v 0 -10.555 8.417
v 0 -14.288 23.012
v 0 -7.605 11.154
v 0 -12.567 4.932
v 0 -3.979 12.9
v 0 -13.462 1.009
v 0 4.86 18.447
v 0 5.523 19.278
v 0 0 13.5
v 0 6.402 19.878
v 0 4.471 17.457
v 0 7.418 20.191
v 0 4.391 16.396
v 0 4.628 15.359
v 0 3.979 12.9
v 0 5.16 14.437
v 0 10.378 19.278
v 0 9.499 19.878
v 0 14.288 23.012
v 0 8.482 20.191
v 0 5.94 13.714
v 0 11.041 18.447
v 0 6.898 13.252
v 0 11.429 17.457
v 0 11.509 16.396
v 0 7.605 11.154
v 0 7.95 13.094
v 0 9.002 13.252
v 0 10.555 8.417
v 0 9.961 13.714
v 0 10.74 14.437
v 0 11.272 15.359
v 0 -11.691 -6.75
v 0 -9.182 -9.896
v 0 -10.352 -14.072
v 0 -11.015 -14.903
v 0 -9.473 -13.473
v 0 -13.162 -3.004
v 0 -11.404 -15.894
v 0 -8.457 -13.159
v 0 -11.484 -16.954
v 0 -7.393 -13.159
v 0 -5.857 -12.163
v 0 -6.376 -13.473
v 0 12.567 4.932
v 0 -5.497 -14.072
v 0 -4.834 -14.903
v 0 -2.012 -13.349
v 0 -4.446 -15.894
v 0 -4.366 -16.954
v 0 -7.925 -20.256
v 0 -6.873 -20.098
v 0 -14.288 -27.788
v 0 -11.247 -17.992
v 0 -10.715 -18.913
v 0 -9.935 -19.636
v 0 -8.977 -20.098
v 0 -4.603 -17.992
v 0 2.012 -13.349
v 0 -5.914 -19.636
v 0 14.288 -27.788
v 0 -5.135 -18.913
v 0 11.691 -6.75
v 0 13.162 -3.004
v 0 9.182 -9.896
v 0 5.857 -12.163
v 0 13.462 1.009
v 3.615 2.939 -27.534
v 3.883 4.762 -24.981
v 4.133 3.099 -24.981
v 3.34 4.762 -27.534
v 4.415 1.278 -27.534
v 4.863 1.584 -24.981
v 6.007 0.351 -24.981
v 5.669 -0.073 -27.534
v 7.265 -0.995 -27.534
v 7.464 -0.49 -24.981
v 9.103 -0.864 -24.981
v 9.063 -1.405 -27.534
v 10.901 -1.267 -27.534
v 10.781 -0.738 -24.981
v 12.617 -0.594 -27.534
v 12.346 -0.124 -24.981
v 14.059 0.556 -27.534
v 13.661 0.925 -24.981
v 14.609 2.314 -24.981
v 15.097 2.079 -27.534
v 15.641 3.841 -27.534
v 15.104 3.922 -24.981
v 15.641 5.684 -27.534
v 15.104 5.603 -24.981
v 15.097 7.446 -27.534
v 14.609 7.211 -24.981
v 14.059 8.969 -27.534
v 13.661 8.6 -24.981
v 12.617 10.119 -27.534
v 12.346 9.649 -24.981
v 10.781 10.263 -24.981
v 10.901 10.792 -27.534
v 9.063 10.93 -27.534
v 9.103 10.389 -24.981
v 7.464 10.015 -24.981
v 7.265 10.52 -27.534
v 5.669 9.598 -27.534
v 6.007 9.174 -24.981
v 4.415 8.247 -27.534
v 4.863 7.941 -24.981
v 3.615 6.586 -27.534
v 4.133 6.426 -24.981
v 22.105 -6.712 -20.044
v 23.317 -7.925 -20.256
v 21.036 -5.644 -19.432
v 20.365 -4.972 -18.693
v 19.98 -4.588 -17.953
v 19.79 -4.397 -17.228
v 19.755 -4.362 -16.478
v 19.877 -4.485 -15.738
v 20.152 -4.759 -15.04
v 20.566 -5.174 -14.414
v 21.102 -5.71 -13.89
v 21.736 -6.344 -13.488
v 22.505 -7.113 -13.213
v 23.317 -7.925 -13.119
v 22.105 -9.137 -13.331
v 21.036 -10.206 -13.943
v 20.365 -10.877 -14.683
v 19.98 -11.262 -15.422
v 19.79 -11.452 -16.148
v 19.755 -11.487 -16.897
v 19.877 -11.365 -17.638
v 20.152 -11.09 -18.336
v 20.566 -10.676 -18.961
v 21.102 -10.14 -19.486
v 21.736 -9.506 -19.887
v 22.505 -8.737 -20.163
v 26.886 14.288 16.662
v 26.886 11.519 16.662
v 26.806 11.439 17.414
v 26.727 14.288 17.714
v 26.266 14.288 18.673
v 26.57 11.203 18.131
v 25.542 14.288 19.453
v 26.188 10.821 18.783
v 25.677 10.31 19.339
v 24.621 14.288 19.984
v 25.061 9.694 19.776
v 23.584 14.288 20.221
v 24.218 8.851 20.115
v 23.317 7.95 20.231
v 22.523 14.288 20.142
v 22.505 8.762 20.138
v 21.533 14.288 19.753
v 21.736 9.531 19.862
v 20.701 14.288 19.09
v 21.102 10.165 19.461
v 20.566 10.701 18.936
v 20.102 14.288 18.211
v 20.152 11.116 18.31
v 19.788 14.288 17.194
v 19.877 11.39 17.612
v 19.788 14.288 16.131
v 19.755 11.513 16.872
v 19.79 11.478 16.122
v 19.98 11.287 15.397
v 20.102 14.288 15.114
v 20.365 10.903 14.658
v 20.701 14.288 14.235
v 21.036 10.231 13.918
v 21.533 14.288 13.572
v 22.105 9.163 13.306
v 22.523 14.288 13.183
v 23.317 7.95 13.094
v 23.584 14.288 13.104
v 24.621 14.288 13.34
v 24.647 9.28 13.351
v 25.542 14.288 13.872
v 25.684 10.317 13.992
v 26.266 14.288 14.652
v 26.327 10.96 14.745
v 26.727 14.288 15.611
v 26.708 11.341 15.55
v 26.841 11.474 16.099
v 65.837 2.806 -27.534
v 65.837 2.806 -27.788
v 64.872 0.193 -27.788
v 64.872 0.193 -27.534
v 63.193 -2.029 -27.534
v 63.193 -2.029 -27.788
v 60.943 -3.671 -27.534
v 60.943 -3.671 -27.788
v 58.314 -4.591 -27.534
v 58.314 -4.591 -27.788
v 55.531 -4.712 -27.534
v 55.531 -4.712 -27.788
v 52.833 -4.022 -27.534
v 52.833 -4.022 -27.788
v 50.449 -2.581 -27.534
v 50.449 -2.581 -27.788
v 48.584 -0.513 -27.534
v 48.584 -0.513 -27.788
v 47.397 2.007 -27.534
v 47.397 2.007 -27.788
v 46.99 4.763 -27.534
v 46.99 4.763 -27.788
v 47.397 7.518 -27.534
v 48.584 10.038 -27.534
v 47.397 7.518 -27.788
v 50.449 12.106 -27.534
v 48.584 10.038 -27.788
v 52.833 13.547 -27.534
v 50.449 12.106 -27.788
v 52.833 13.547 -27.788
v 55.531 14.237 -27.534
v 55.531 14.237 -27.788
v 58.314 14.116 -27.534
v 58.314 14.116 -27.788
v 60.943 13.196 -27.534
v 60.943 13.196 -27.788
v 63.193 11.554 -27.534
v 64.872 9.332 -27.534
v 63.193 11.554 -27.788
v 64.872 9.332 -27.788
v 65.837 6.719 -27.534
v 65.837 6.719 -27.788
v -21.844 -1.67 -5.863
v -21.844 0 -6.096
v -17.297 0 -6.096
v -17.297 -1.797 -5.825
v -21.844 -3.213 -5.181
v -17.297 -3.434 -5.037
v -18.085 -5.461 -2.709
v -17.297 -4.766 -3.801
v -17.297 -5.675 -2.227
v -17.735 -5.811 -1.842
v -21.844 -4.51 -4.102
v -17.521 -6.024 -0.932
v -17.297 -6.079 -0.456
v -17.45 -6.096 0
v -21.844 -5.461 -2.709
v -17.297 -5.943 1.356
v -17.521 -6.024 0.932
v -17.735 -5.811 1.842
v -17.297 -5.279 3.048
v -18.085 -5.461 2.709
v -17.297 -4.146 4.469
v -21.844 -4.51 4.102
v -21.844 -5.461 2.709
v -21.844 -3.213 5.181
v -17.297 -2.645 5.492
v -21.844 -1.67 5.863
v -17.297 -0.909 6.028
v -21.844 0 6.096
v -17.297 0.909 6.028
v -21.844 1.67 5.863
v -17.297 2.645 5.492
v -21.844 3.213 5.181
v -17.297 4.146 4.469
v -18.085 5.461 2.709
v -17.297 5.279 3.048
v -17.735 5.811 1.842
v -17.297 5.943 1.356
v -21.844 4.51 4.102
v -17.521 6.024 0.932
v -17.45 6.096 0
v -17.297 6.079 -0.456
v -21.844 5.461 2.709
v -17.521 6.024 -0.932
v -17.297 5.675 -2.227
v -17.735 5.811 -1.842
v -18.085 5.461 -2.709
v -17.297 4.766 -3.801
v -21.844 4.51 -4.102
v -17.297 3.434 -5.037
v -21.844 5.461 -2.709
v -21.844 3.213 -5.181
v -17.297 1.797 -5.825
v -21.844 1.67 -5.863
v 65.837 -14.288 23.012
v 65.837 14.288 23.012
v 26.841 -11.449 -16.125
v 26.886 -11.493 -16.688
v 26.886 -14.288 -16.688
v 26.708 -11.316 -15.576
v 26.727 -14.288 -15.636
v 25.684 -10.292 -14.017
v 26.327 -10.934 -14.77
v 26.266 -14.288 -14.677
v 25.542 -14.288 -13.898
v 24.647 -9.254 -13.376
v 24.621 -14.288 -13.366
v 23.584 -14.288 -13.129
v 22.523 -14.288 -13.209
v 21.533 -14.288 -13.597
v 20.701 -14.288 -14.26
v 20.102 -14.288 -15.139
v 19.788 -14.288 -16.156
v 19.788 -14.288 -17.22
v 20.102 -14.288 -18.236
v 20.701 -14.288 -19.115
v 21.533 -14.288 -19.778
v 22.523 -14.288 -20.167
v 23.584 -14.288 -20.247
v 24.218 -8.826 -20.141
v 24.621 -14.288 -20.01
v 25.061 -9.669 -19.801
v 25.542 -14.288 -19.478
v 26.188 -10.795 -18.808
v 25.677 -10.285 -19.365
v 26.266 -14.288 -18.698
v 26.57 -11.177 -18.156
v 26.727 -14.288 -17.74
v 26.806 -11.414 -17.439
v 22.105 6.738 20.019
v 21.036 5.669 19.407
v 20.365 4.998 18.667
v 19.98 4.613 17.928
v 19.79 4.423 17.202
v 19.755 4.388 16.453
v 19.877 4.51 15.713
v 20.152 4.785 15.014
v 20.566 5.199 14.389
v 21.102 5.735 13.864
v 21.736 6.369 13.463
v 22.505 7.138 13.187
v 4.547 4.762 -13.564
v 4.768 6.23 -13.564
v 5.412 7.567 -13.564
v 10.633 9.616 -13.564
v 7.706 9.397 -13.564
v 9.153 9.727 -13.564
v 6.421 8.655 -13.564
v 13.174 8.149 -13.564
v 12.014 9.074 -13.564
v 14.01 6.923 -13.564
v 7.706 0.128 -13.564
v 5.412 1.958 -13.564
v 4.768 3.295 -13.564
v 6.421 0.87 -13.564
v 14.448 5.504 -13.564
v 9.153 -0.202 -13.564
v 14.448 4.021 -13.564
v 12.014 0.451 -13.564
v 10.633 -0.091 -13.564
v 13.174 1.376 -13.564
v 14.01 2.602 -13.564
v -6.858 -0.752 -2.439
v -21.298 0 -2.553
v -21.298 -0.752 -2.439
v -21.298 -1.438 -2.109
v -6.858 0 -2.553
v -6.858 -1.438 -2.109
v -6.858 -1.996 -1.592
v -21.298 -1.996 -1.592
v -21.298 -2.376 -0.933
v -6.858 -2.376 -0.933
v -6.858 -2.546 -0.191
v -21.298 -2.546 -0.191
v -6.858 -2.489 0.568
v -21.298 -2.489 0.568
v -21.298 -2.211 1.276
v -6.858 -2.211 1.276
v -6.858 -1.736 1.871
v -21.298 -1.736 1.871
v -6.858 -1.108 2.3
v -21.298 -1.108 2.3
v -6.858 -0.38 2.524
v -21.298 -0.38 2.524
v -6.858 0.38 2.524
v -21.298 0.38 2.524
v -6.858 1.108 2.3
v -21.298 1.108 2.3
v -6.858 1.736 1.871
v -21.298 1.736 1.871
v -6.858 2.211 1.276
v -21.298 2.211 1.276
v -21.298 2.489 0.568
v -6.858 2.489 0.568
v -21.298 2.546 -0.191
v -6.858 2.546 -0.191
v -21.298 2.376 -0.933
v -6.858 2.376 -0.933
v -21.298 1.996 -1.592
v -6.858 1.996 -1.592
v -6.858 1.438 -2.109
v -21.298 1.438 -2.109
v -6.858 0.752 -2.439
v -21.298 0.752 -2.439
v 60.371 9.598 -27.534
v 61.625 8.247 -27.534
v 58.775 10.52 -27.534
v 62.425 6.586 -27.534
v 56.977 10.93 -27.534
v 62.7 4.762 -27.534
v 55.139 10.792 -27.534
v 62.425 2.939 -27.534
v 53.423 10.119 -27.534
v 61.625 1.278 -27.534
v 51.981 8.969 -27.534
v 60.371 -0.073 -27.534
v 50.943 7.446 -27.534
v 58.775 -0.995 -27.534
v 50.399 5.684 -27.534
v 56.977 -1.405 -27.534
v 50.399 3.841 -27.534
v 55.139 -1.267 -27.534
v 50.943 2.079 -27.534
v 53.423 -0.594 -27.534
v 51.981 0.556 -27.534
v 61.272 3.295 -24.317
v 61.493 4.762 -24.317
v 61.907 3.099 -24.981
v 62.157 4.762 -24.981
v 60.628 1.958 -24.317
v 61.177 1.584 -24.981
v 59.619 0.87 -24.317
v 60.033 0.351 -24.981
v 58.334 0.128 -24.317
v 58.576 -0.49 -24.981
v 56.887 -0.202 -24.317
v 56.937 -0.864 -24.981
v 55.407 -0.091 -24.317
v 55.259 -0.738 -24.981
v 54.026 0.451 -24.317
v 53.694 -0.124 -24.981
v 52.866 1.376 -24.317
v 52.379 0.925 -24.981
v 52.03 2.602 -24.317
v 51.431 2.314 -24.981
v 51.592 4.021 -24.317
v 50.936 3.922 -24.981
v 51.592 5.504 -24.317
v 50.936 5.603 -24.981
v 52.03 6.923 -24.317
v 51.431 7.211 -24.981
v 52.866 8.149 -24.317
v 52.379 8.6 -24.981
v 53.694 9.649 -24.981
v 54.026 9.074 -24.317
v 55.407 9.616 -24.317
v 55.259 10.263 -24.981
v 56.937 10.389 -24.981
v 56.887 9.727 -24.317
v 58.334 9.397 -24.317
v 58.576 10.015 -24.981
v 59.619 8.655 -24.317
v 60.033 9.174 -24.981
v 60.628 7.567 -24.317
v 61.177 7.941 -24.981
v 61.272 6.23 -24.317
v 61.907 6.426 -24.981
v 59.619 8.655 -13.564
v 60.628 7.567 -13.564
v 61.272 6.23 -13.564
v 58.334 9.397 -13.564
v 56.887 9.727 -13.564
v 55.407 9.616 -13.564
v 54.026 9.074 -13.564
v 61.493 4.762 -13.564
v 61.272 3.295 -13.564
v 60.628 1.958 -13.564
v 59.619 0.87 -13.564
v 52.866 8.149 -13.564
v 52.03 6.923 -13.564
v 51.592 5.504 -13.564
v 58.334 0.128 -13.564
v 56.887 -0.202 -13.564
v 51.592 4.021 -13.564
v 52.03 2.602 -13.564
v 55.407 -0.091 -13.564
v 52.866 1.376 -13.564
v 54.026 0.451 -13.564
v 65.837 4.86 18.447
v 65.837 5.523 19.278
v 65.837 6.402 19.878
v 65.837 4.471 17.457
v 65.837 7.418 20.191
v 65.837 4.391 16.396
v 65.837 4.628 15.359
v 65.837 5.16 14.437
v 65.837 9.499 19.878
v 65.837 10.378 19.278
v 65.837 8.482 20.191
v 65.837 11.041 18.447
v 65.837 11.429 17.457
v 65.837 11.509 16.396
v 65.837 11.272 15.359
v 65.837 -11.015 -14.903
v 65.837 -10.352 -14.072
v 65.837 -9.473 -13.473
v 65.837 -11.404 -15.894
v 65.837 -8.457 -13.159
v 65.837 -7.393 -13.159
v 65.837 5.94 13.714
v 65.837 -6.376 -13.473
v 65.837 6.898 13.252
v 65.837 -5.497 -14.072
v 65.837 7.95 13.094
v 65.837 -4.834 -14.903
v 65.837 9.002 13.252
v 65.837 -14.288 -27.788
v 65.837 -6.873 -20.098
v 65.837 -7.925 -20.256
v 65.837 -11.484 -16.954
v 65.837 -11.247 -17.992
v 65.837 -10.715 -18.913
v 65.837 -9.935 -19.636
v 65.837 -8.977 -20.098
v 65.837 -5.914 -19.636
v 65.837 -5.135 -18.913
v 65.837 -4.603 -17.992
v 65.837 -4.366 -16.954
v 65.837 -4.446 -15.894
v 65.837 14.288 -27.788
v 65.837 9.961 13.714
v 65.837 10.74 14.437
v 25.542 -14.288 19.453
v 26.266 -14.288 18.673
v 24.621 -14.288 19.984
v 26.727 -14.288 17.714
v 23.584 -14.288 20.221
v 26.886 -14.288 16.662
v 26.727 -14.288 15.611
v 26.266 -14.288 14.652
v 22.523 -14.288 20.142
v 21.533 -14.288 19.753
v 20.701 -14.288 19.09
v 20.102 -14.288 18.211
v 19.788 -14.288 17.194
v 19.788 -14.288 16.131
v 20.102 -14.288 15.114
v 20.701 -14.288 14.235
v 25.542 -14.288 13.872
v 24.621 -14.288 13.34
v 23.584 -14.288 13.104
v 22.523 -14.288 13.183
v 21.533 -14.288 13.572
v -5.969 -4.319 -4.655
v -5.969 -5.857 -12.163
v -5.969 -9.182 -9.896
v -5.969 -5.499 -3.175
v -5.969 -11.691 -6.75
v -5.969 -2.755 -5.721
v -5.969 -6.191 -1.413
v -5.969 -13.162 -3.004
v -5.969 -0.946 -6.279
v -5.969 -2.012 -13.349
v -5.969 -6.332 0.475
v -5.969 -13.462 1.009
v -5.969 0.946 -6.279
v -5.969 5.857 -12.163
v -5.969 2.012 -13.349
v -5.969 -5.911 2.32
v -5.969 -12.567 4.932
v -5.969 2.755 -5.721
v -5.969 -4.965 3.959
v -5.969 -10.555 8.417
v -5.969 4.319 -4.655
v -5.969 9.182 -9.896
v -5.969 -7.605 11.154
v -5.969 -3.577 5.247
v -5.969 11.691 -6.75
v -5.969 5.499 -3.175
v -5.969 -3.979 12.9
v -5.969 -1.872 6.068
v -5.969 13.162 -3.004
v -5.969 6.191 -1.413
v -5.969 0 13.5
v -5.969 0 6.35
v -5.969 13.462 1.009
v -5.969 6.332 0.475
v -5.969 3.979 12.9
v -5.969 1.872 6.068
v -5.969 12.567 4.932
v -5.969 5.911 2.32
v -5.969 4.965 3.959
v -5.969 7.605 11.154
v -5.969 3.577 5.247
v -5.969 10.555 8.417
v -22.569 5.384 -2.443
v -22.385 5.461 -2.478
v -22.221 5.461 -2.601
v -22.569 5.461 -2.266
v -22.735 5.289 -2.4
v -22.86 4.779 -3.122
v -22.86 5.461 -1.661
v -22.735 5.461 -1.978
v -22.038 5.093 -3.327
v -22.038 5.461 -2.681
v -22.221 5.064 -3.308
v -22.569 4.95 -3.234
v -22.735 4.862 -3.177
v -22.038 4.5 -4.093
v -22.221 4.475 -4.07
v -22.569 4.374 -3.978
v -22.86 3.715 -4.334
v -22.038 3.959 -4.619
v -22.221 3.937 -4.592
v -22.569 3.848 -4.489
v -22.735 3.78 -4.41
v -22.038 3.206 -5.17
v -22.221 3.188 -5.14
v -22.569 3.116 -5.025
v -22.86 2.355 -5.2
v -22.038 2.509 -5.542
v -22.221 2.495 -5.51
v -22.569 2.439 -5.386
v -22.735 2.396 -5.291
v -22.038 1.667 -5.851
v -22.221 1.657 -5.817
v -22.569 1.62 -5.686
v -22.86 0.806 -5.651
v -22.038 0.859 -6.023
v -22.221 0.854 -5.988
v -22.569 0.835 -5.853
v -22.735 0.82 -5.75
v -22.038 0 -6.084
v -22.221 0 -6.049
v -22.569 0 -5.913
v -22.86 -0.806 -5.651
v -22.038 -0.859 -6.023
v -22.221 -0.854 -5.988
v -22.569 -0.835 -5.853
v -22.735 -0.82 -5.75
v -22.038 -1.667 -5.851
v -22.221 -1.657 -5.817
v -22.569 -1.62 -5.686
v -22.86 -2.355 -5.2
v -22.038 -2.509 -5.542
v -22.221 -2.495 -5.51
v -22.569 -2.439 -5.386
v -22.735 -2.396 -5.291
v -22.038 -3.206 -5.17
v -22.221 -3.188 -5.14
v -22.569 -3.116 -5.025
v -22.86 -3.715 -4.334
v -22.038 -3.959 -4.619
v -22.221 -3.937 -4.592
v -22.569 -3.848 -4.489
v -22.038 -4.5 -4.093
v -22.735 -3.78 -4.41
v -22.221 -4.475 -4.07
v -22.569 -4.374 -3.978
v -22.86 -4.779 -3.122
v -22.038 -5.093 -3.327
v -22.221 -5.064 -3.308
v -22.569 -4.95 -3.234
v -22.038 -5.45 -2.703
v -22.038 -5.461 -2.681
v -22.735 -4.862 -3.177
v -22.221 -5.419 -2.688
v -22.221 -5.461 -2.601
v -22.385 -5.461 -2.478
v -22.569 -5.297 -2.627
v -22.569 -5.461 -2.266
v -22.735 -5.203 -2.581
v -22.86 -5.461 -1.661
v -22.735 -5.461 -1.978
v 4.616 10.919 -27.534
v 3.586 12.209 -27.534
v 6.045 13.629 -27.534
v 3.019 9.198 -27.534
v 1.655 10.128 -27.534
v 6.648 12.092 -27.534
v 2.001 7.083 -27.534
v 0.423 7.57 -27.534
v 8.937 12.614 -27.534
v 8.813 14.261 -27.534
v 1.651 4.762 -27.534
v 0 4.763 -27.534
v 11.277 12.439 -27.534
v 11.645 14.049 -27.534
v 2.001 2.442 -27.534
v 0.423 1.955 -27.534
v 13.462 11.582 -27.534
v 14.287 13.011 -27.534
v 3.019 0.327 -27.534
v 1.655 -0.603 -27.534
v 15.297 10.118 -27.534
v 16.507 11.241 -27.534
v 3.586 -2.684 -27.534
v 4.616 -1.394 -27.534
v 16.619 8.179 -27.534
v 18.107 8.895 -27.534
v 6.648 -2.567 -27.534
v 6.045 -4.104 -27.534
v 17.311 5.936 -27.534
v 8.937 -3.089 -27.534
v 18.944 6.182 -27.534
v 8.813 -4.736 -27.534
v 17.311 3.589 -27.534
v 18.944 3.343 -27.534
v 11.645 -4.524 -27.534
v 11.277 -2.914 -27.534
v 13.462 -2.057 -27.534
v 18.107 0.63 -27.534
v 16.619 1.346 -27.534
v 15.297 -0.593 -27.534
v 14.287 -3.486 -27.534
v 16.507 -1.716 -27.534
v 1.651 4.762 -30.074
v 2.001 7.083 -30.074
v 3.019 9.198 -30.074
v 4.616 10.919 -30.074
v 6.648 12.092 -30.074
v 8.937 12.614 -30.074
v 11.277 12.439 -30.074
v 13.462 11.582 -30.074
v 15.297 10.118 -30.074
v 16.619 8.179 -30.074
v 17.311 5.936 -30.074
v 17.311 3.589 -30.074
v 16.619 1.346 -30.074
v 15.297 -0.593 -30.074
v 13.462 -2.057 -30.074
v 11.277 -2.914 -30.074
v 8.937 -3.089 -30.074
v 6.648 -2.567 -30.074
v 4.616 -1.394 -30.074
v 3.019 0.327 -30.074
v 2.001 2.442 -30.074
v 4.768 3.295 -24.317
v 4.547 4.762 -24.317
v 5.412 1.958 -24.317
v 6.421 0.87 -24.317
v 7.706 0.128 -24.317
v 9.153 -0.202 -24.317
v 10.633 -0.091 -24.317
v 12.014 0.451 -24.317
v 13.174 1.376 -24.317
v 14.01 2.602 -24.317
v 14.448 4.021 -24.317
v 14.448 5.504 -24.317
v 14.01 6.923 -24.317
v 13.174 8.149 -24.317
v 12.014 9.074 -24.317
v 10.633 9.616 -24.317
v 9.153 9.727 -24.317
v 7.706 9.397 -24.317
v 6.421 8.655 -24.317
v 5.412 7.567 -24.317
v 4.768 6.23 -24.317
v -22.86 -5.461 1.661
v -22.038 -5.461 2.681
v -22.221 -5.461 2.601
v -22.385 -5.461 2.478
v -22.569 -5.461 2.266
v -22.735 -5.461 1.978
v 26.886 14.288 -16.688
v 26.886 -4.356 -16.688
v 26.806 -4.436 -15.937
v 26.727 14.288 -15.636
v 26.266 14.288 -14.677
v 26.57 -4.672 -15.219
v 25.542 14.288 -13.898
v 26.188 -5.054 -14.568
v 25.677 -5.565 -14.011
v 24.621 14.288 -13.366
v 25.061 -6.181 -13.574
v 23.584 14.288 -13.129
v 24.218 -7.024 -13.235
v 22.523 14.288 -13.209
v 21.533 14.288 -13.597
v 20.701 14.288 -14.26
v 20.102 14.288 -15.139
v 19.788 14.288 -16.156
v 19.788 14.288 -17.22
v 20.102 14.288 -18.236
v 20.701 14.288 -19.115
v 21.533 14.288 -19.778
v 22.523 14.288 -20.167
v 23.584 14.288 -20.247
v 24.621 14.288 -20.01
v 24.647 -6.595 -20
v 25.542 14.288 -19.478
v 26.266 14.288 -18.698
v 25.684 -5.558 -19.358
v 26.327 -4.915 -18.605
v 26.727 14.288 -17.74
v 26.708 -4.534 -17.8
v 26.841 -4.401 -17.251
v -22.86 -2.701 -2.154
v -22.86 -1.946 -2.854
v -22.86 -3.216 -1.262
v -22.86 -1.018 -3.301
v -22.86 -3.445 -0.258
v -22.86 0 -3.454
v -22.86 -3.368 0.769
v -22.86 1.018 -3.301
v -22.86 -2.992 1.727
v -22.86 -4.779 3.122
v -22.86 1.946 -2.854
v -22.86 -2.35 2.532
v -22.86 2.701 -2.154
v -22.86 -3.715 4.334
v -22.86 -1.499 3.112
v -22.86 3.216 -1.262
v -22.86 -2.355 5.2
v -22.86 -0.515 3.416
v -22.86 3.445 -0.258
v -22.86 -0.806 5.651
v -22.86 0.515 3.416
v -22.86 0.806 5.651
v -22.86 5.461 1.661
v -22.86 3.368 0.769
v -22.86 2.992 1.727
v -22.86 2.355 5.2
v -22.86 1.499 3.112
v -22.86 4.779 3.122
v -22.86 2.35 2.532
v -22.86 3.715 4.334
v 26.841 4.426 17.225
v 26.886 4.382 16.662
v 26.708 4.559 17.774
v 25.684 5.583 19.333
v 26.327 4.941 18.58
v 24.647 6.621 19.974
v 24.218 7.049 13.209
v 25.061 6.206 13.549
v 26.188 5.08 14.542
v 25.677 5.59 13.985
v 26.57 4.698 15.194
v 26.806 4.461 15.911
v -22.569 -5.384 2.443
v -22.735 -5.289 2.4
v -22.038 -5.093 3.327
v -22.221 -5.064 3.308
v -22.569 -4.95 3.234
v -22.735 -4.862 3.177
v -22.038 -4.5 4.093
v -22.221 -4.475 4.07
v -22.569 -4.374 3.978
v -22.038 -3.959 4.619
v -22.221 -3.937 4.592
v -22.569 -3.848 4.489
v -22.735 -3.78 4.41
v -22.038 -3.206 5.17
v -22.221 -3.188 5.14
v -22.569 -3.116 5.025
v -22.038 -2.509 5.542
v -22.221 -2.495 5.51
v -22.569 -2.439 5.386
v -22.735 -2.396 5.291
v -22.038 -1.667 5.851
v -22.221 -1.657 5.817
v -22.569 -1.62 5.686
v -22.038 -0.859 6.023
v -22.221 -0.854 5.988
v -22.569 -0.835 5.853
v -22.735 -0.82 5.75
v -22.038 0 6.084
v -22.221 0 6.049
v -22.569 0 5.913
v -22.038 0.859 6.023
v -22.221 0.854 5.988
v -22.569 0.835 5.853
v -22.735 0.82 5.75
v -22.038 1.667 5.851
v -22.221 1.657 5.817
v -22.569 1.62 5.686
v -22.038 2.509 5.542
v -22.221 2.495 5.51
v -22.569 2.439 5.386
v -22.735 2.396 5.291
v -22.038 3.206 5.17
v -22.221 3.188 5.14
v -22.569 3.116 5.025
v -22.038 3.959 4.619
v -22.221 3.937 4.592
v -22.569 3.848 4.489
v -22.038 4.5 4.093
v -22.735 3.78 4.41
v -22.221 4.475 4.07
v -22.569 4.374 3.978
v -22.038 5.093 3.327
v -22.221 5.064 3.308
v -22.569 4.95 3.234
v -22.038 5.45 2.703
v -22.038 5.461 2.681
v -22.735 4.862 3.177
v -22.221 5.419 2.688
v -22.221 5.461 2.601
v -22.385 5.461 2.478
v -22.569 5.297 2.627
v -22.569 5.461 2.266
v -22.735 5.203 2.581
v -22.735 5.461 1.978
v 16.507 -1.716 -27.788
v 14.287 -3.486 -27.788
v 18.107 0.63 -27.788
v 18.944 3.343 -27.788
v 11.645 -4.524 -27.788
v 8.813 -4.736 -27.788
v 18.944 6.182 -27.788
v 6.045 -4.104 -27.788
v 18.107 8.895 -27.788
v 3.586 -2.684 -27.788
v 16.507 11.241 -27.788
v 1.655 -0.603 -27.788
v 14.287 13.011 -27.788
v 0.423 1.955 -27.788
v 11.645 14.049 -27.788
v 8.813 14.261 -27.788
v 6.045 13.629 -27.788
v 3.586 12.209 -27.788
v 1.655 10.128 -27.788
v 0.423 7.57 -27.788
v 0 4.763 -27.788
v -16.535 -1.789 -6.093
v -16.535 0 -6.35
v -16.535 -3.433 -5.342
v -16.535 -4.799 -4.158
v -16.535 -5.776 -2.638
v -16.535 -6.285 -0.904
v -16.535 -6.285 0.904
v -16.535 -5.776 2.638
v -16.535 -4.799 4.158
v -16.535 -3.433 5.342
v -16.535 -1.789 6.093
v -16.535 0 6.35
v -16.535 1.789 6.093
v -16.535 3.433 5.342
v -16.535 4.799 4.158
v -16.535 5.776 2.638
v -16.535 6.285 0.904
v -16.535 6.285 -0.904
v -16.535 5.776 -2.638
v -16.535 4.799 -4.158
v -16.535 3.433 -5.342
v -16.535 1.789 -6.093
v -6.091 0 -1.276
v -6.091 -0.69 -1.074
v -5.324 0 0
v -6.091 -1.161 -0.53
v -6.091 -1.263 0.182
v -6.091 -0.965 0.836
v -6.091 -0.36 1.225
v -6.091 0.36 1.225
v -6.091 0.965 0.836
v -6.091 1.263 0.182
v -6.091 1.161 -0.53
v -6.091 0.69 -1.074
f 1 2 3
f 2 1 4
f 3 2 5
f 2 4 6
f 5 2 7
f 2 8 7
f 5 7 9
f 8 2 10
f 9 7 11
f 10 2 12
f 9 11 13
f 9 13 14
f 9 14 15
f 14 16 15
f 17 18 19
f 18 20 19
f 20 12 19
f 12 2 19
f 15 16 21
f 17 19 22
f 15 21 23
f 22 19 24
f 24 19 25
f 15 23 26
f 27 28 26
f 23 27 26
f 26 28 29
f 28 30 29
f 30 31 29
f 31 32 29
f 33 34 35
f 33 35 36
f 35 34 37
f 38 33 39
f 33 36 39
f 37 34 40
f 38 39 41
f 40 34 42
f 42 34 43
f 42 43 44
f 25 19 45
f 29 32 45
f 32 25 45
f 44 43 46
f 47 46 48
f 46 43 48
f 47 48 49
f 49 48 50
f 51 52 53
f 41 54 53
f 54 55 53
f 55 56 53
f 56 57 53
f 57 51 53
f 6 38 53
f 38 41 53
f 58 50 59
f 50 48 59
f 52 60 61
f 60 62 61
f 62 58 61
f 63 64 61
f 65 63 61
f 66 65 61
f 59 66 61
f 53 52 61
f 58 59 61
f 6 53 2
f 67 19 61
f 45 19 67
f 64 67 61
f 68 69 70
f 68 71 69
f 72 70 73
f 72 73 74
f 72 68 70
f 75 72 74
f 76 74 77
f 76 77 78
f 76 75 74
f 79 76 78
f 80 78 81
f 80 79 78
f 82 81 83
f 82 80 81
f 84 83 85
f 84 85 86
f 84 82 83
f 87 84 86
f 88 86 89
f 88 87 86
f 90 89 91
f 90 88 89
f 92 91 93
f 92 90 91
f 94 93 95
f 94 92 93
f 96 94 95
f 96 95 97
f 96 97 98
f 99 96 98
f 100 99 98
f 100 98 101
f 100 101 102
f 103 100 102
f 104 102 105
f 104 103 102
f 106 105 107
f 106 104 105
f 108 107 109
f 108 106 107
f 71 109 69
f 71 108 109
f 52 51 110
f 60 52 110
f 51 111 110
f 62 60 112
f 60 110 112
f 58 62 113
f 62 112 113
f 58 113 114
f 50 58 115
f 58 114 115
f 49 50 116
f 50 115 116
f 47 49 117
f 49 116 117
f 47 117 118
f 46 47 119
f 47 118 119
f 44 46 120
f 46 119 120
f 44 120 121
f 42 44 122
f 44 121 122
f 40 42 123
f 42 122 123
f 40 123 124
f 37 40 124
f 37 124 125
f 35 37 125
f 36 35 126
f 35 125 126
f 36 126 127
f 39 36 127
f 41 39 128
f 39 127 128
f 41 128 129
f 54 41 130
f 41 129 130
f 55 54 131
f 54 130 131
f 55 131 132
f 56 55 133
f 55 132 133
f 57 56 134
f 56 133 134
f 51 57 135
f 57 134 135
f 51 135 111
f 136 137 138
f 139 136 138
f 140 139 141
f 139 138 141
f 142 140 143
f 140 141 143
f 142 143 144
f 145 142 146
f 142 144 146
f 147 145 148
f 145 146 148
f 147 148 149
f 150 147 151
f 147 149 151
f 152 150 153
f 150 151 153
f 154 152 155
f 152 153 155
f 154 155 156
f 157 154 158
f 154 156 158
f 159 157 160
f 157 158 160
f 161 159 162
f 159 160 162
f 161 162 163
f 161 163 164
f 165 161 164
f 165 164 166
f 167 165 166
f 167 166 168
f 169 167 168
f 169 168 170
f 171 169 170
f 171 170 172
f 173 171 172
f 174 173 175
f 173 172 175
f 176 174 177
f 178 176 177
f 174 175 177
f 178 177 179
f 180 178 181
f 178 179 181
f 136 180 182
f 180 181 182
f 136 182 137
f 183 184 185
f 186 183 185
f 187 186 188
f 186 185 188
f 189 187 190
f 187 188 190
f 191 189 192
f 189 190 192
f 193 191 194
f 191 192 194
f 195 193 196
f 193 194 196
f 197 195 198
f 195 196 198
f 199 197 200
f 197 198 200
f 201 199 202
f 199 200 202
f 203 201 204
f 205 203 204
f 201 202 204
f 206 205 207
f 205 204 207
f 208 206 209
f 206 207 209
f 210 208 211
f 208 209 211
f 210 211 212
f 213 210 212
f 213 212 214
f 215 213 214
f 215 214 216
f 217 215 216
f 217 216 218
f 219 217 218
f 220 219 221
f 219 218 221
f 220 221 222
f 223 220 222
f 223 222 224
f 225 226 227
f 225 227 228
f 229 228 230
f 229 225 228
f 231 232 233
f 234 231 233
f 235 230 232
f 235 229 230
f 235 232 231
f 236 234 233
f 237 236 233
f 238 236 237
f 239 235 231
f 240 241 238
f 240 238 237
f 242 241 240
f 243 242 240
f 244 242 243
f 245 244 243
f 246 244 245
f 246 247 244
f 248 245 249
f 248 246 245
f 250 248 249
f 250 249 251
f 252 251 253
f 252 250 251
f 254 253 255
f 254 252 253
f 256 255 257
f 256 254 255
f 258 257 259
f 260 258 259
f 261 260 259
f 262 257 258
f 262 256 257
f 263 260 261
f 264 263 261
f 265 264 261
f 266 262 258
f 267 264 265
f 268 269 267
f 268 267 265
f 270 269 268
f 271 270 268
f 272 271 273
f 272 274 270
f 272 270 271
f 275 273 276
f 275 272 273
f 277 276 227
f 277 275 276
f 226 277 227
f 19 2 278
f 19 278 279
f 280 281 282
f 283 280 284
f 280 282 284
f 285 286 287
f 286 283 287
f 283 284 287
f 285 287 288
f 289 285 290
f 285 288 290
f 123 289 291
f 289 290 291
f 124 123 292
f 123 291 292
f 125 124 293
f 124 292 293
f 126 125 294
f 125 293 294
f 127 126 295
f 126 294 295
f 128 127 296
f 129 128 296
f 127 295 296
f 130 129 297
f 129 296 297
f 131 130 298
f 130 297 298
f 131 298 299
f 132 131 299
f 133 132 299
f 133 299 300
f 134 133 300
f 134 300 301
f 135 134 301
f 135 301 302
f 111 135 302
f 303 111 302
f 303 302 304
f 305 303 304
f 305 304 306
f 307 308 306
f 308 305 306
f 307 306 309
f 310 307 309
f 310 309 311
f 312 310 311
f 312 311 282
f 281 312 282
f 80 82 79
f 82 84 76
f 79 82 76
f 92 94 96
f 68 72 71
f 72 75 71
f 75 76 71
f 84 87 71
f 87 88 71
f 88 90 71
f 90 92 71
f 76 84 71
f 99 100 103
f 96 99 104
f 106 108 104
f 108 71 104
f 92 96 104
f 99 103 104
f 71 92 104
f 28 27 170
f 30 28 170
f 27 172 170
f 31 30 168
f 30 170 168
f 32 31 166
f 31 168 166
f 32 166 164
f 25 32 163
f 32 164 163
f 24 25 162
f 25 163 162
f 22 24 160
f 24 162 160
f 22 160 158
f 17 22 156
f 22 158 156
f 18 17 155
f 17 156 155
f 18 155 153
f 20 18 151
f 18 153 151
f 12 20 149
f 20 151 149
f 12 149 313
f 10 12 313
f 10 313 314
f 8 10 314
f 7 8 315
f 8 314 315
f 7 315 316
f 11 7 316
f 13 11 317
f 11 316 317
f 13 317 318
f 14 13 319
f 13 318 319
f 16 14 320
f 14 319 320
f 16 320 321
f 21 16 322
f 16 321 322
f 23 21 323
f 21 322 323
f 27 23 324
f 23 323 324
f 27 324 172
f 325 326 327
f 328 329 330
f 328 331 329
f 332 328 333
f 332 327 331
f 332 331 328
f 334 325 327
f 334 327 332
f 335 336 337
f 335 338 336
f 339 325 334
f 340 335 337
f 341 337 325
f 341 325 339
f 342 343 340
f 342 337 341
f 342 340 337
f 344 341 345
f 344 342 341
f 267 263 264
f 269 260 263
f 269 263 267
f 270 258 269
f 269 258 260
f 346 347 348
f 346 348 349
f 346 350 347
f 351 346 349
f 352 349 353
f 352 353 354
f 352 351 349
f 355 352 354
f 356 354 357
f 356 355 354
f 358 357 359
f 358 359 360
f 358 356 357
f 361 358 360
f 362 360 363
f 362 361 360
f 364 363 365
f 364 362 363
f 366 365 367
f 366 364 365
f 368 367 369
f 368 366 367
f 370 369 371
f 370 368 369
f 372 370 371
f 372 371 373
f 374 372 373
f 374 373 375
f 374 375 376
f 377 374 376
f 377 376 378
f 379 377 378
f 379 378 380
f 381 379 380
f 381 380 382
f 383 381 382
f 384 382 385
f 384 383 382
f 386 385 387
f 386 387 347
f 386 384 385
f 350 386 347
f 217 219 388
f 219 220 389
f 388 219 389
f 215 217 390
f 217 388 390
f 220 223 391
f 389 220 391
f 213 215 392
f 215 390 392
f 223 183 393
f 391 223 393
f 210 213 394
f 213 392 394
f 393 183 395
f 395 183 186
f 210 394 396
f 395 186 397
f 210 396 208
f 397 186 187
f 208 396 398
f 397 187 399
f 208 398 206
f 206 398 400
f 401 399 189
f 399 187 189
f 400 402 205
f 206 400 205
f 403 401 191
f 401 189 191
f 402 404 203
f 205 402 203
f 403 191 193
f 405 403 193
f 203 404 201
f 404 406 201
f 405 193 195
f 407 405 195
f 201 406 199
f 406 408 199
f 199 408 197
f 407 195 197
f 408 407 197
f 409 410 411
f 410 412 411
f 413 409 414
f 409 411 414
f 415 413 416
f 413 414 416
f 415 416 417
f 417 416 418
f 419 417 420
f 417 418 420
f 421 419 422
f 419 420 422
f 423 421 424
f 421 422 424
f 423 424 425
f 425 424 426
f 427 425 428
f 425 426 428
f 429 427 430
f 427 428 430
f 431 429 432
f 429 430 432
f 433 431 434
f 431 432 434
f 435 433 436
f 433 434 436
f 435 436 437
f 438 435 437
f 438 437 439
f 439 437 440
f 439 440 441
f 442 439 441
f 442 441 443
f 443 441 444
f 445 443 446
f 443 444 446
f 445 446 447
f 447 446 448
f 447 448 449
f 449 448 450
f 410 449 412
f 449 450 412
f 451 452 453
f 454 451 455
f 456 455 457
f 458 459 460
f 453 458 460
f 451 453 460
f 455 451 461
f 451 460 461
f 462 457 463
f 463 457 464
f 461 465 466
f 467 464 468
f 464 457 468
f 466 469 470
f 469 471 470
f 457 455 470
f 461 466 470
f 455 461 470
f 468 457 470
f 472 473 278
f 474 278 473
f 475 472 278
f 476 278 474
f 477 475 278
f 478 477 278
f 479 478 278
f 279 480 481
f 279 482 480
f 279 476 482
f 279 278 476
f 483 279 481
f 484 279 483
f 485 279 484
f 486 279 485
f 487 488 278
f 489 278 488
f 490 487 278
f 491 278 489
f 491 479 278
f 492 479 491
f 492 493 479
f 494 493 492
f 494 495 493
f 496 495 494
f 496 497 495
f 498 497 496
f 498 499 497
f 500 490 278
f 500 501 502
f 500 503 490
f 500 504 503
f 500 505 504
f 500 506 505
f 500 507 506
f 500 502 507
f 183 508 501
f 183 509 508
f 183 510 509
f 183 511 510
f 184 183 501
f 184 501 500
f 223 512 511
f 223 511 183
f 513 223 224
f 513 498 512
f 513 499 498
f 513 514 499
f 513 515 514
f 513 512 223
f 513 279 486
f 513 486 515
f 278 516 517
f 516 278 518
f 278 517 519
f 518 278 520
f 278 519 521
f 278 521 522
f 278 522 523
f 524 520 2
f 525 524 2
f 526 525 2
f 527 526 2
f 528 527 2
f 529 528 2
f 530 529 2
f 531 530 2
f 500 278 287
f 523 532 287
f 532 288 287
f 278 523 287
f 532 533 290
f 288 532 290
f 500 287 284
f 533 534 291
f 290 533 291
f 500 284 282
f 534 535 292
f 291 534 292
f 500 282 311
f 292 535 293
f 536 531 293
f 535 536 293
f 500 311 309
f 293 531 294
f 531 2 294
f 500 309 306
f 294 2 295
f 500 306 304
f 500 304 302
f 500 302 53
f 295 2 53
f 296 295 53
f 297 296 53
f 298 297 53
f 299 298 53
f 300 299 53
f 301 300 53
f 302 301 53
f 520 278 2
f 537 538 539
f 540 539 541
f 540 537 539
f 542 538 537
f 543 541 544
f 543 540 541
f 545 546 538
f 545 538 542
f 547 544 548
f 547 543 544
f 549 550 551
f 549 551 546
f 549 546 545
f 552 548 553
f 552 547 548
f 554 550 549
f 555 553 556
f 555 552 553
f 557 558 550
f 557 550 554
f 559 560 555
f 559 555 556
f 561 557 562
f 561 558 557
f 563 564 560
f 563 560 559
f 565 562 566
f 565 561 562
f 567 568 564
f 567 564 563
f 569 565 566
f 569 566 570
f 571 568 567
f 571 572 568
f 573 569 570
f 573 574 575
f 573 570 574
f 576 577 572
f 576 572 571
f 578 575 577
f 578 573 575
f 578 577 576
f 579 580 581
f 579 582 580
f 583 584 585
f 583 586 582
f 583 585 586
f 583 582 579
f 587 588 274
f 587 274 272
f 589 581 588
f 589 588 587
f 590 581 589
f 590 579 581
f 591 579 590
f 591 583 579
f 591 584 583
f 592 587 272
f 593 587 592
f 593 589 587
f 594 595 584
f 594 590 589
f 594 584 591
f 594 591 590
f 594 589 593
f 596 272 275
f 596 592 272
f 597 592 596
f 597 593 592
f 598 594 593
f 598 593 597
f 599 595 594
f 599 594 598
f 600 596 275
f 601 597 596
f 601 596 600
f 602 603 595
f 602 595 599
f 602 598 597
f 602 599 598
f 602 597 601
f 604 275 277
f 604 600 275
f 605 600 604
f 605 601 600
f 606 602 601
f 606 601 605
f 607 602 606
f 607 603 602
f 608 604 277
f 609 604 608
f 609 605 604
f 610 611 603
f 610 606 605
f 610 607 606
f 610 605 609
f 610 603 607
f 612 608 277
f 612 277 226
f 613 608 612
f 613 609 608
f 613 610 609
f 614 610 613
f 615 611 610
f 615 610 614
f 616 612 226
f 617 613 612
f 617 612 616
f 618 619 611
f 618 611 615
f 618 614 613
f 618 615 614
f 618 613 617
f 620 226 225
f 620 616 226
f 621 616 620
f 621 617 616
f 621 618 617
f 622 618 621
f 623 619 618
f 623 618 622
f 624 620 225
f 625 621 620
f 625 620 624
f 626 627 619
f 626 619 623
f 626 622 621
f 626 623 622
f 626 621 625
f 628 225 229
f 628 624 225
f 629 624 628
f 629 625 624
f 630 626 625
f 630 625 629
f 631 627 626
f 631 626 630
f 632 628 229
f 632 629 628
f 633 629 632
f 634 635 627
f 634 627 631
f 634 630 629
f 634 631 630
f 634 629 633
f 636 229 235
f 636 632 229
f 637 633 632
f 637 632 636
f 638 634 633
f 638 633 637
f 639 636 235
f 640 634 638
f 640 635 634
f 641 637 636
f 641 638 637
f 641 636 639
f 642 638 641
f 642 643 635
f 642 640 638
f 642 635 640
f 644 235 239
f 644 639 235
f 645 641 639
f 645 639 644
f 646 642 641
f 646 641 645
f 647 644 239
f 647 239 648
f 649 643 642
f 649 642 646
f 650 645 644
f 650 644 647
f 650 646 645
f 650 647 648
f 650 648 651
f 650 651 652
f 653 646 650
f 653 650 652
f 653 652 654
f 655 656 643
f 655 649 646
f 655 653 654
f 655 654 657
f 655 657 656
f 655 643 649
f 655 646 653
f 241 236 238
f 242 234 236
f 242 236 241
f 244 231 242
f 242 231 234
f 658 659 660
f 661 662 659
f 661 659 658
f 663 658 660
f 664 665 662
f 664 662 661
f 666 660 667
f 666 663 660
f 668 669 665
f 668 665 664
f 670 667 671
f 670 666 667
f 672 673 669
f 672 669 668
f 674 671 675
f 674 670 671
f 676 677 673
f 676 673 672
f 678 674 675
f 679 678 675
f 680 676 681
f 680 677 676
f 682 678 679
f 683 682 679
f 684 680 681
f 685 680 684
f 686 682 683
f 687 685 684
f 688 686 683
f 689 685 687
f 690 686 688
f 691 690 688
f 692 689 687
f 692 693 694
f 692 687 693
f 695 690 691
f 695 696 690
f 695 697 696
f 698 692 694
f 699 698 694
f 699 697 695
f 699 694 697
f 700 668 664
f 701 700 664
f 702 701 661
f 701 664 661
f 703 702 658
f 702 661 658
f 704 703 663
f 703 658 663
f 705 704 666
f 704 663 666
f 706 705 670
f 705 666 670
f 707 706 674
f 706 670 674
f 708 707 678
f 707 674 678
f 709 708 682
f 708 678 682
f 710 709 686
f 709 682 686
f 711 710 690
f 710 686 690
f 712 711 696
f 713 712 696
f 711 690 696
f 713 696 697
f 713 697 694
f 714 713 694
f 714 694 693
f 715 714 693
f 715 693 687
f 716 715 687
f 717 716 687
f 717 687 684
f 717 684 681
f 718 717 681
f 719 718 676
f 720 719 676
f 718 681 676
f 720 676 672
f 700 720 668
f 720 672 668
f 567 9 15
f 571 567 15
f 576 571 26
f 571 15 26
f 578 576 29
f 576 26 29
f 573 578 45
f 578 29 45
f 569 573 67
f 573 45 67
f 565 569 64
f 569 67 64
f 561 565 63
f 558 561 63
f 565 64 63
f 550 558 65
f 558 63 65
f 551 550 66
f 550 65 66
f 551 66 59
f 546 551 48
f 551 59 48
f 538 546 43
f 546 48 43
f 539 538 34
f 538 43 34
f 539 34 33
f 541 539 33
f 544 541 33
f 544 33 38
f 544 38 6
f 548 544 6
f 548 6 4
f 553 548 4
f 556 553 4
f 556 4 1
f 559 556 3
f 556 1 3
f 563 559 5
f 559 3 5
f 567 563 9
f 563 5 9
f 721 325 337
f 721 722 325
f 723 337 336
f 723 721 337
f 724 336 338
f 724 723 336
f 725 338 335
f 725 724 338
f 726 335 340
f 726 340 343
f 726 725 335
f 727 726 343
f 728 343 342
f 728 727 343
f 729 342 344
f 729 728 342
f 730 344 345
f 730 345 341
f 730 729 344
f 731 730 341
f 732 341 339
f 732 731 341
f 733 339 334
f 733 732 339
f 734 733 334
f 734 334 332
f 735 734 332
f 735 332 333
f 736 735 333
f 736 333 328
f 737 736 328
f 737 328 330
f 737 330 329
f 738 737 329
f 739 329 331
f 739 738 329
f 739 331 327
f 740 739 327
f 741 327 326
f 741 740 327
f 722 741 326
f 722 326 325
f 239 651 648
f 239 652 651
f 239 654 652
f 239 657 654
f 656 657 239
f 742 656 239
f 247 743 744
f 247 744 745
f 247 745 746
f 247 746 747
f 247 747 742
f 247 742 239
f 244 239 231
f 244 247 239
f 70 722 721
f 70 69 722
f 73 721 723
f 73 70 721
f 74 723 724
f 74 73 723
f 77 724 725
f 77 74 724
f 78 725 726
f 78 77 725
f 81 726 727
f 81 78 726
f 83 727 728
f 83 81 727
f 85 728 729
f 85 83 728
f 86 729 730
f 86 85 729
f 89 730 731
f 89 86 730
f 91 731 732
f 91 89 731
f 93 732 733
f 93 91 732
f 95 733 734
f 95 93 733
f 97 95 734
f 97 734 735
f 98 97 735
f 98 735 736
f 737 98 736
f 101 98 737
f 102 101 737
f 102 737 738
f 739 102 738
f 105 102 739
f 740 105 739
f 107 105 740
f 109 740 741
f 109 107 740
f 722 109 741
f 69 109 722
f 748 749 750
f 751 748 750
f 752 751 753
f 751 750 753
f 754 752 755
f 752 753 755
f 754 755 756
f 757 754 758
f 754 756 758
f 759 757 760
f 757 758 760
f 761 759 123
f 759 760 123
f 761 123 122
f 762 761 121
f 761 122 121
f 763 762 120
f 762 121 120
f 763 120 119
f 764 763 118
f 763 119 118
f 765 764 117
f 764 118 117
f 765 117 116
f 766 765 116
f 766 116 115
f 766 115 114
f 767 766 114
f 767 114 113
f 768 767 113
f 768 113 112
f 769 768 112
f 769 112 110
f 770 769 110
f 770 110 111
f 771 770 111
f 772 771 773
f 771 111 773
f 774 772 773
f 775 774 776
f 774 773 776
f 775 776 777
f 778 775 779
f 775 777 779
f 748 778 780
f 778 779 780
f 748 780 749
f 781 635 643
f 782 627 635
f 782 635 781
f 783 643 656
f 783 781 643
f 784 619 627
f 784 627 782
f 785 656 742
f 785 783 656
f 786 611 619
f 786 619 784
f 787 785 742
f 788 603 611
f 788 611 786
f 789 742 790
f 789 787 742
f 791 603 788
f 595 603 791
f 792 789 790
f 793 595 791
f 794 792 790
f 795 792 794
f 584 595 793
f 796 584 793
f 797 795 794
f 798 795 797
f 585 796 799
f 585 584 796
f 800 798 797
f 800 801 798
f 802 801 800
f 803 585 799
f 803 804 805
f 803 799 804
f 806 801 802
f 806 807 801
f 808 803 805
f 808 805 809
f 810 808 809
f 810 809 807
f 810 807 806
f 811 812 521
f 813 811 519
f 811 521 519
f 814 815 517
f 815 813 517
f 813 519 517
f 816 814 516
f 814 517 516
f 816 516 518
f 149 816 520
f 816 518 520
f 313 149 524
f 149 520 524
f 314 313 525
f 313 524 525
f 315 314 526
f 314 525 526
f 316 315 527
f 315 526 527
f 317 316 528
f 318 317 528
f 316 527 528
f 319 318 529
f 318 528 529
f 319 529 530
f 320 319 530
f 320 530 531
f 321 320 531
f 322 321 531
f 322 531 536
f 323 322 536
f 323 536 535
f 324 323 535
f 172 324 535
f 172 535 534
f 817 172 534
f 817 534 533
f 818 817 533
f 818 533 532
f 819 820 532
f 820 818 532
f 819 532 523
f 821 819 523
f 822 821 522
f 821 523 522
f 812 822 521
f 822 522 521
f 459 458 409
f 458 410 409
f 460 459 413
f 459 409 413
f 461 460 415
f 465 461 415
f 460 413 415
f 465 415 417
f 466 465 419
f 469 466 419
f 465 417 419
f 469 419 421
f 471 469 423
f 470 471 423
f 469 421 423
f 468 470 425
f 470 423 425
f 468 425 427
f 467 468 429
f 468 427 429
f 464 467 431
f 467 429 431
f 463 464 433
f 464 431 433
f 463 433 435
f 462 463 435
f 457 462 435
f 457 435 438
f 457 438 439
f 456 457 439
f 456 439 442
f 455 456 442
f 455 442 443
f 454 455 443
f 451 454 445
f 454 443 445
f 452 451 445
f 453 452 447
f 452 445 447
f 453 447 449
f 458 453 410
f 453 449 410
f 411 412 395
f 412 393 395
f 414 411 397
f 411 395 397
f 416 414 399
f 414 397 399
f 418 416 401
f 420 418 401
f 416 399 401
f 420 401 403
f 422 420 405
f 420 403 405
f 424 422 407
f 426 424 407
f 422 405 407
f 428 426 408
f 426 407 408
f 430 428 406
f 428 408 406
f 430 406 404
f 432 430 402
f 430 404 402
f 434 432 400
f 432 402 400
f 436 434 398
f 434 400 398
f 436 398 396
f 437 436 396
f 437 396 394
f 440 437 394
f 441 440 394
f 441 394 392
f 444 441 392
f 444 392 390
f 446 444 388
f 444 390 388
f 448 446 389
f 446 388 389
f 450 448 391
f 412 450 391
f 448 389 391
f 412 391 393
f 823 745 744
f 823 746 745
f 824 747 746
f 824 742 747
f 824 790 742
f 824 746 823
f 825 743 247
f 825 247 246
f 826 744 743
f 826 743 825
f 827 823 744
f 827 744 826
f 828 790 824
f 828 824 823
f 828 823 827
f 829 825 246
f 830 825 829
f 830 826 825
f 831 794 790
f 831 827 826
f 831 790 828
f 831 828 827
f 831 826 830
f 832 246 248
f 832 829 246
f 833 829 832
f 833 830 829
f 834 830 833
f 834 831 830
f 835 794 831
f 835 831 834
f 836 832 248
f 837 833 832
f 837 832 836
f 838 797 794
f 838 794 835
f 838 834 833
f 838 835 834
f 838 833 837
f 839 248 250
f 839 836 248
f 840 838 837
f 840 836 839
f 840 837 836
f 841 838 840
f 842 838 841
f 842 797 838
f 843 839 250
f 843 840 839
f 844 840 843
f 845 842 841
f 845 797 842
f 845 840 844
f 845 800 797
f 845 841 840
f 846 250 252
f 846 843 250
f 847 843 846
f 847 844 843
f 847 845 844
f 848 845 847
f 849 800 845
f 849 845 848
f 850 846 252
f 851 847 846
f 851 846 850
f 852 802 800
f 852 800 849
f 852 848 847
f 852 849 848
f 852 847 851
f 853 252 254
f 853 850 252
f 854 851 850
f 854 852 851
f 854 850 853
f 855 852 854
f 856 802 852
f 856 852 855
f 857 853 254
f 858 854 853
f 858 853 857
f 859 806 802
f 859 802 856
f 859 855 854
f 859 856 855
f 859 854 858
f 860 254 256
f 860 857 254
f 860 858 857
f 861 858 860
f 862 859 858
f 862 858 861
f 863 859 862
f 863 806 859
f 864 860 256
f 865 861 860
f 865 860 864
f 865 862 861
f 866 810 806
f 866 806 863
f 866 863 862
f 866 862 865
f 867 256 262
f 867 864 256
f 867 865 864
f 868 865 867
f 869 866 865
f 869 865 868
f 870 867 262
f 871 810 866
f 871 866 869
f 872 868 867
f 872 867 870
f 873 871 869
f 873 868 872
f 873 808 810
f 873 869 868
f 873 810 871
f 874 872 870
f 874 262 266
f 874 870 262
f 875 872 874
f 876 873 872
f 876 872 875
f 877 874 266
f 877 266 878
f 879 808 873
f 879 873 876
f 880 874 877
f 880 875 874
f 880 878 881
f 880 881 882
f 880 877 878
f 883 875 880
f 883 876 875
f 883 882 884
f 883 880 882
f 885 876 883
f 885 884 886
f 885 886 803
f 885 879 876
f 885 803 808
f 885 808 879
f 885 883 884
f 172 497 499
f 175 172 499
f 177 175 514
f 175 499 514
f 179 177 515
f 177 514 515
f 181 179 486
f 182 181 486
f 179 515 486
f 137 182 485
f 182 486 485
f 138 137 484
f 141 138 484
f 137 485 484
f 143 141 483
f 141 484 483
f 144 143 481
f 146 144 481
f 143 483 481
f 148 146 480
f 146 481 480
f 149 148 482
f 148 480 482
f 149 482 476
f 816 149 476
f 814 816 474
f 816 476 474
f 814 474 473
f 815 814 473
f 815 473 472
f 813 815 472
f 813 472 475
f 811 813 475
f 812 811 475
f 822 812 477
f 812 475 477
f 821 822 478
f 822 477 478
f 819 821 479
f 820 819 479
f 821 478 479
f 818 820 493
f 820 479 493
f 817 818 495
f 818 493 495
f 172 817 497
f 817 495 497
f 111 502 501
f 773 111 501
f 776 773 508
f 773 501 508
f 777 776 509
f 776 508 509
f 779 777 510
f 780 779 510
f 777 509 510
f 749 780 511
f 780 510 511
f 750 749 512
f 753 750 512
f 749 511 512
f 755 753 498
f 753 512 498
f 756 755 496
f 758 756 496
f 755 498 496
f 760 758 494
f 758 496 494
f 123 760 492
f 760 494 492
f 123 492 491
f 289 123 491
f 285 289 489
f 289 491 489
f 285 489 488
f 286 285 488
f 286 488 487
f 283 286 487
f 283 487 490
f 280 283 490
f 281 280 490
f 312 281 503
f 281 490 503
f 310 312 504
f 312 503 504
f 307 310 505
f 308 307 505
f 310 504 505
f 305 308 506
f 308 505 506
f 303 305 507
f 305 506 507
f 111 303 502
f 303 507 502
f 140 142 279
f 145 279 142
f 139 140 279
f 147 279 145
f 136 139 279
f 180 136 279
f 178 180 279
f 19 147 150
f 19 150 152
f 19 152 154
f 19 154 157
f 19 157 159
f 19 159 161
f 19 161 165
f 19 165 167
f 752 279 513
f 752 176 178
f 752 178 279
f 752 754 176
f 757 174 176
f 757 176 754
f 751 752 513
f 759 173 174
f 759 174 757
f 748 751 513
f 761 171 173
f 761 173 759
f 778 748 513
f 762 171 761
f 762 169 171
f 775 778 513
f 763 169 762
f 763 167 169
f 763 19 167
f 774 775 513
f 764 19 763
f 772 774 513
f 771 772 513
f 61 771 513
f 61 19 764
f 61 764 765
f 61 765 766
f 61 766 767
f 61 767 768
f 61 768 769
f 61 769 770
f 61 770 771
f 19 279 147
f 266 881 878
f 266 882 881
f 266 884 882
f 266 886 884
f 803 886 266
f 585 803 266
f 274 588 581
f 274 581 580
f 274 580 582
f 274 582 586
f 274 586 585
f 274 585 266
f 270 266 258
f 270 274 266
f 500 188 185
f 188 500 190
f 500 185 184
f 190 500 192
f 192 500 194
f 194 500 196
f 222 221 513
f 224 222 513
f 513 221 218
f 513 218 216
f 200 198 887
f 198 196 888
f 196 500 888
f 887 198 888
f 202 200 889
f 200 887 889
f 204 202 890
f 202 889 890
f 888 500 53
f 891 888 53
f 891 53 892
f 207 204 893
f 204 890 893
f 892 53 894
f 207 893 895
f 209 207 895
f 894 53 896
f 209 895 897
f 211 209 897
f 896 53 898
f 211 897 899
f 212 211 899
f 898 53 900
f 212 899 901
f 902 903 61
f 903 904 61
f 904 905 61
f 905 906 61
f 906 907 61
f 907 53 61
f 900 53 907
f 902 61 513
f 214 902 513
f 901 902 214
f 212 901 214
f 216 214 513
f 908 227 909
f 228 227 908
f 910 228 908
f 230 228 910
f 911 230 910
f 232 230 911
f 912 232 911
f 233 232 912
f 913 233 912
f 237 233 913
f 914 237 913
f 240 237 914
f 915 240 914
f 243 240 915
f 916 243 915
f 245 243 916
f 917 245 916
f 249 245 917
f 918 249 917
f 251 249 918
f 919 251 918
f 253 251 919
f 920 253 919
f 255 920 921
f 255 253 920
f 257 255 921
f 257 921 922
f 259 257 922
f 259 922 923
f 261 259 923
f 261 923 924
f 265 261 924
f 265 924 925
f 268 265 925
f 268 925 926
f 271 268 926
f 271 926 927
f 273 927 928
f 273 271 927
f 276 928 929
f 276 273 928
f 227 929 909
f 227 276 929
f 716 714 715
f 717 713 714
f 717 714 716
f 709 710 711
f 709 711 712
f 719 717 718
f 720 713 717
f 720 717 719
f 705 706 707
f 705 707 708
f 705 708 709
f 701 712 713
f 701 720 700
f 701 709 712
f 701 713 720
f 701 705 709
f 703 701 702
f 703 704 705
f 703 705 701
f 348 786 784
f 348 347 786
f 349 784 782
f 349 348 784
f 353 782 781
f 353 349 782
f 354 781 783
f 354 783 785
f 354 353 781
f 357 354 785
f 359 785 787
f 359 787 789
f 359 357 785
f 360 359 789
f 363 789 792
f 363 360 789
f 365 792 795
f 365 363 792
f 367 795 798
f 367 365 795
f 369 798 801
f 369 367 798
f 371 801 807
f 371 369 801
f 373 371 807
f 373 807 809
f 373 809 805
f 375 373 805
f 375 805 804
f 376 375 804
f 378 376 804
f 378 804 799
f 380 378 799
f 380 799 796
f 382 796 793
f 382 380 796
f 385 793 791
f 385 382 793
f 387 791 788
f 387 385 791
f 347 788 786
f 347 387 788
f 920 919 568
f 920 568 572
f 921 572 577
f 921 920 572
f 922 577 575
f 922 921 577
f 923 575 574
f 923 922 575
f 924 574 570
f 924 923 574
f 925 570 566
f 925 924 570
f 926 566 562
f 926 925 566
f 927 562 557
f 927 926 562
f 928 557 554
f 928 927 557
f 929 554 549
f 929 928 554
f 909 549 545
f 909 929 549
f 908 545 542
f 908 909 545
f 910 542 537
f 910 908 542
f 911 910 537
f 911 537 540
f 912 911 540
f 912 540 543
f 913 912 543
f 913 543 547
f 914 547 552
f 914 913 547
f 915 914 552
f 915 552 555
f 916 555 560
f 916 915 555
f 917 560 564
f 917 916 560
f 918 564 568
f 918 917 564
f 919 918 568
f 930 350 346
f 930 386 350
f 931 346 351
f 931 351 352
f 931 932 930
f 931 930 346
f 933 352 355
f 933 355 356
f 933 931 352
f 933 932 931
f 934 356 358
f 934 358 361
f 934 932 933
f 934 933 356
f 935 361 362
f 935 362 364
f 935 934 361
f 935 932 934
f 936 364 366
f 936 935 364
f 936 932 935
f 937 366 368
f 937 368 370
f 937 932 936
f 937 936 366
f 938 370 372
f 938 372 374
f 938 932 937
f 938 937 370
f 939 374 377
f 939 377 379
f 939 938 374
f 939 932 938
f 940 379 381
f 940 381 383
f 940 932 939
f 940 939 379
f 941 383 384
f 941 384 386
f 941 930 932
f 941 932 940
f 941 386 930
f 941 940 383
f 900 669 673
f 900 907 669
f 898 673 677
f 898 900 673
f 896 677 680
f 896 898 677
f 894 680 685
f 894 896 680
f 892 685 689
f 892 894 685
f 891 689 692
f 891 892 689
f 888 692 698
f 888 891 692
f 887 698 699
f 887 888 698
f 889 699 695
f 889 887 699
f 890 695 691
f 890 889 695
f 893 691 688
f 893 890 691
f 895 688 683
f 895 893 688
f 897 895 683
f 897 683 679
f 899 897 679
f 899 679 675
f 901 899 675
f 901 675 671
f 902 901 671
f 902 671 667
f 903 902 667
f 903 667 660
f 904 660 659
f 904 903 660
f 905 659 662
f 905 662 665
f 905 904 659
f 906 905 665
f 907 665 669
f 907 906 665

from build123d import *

# Parameters (mm, degrees)
SKETCH1_W          = 50.8
SKETCH1_H          = 28.575
EXTRUDE1_DEPTH     = 65.8368
SKETCH5_R          = 13.5001
EXTRUDE2_DEPTH     = 5.969
SKETCH6_W          = 6.35
SKETCH6_H          = 16.891
CUT_EXTRUDE4_DEPTH = 30.48
SKETCH13_R         = 7.874
EXTRUDE3_DEPTH     = 2.54
HOLE1_D            = 7.1374
HOLE1_DEPTH        = 65.8368
HOLE2_D            = 7.1374
HOLE2_DEPTH        = 28.575


with BuildPart() as part:
    # Sketch1 → Extrude1 (new body)
    with BuildSketch(Plane(origin=(0, 0, 0), x_dir=(0, 0, -1), z_dir=(1, 0, 0))):
        with Locations((2.3876, 0)):
            Rectangle(SKETCH1_W, SKETCH1_H)
    extrude(amount=EXTRUDE1_DEPTH)

    # S2D0002 → Cut-Revolve1 (revolve, cut)
    with BuildSketch(Plane(origin=(0, 4.7625, 0), x_dir=(-1, 0, 0), z_dir=(0, 1, 0)), mode=Mode.PRIVATE) as cut_revolve1_sk:
        Polygon((-15.7099, -27.5336), (-19.0499873, -27.5336), (-19.0499873, -27.7876), (-9.525, -27.7876), (-9.525, -13.5636), (-14.5034, -13.5636), (-14.5034, -24.316993135), (-15.167306865, -24.9809), align=None)
    revolve(cut_revolve1_sk.sketch.rotate(Axis((9.525, 4.7625, -19.13842003), (0, 0, 1)), 180), axis=Axis((9.525, 4.7625, -19.13842003), (0, 0, 1)), mode=Mode.SUBTRACT)  # turned: the seam where the file's is

    # Sketch3 → Cut-Revolve2 (revolve, cut)
    with BuildSketch(Plane(origin=(41.148, 4.7625, -25.146), x_dir=(1, 0, 0), z_dir=(0, 1, 0))):
        Polygon((21.5519, 2.3876), (24.8919873, 2.3876), (24.8919873, 2.6416), (15.367, 2.6416), (15.367, -11.5824), (20.3454, -11.5824), (20.3454, -0.829006865), (21.009306865, -0.1651), align=None)
    revolve(axis=Axis((56.515, 4.7625, -3.189624441), (0, 0, -1)), mode=Mode.SUBTRACT)

    # Sketch5 → Extrude2 (add)
    with BuildSketch(Plane.ZY):
        Circle(SKETCH5_R)
    extrude(amount=EXTRUDE2_DEPTH)

    # Sketch6 → Revolve1 (revolve)
    with BuildSketch(Plane(origin=(0, 0, 0), x_dir=(0, 0, 1), z_dir=(0, -1, 0)), mode=Mode.PRIVATE) as revolve1_sk:
        with Locations((-3.175, 14.4145)):
            Rectangle(SKETCH6_W, SKETCH6_H)
    revolve(revolve1_sk.sketch.rotate(Axis((5.754582971, 0, 0), (-1, 0, 0)), 180), axis=Axis((5.754582971, 0, 0), (-1, 0, 0)))  # turned: the seam where the file's is

    # S2D0001 → Cut-Revolve4 (revolve, cut)
    with BuildSketch(Plane(origin=(-18.511260017, 3.2639, 0), x_dir=(0, 1, 0), z_dir=(0, 0, 1)), mode=Mode.PRIVATE) as cut_revolve4_sk:
        Polygon((-0.7112, 2.786949769), (-0.7112, -11.653260017), (-3.2639, -13.18707692), (-3.2639, 4.348739983), (0.1905, 4.348739983), align=None)
    revolve(cut_revolve4_sk.sketch.rotate(Axis((0, 0, 0), (-1, 0, 0)), 90), axis=Axis((0, 0, 0), (-1, 0, 0)), mode=Mode.SUBTRACT)  # turned: the seam where the file's is

    # Sketch8 → Cut-Revolve5 (revolve, cut)
    with BuildSketch(Plane(origin=(0, 0, 0), x_dir=(0, 0, -1), z_dir=(0, 1, 0)), mode=Mode.PRIVATE) as cut_revolve5_sk:
        with BuildLine():
            Line((-6.35, 16.5354), (-6.096, 17.2974))
            Line((-6.096, 17.2974), (-6.096, 21.844))
            ThreePointArc((-6.096, 21.844), (-5.995678675, 22.387796865), (-5.707922533, 22.86))
            Line((-5.707922533, 22.86), (-6.35, 22.86))
            Line((-6.35, 22.86), (-6.35, 16.5354))
        make_face()
    revolve(cut_revolve5_sk.sketch.rotate(Axis((-12.65936, 0, 0), (-1, 0, 0)), 180), axis=Axis((-12.65936, 0, 0), (-1, 0, 0)), mode=Mode.SUBTRACT)  # turned: the seam where the file's is

    # Sketch12 → Cut-Extrude4 (cut, symmetric)
    with BuildSketch(Plane(origin=(0, 0, 0), x_dir=(0, -1, 0), z_dir=(0, 0, -1))):
        Polygon((5.461, 22.86), (5.461, 18.0848), (6.096, 17.4498), (6.096, 22.86), align=None)
        Polygon((-5.461, 22.86), (-5.461, 18.0848), (-6.096, 17.4498), (-6.096, 22.86), align=None)
    extrude(amount=CUT_EXTRUDE4_DEPTH, both=True, mode=Mode.SUBTRACT)

    # Sketch13 → Extrude3 (add)
    with BuildSketch(Plane(origin=(0, 0, -27.5336), x_dir=(-1, 0, 0), z_dir=(0, 0, -1))):
        with Locations((-9.525, 4.7625)):
            Circle(SKETCH13_R)
    extrude(amount=EXTRUDE3_DEPTH)

    # Hole1
    with Locations(Plane.ZY):
        with Locations((-16.6878, -7.9248), (16.6624, 7.9502)):
            Hole(HOLE1_D / 2, depth=HOLE1_DEPTH)

    # Hole2
    with Locations(Plane(origin=(0, 14.2875, 0), x_dir=(-1, 0, 0), z_dir=(0, 1, 0))):
        with Locations((-23.3172, -16.6878), (-23.3172, 16.6624)):
            Hole(HOLE2_D / 2, depth=HOLE2_DEPTH)


solid = part.part
